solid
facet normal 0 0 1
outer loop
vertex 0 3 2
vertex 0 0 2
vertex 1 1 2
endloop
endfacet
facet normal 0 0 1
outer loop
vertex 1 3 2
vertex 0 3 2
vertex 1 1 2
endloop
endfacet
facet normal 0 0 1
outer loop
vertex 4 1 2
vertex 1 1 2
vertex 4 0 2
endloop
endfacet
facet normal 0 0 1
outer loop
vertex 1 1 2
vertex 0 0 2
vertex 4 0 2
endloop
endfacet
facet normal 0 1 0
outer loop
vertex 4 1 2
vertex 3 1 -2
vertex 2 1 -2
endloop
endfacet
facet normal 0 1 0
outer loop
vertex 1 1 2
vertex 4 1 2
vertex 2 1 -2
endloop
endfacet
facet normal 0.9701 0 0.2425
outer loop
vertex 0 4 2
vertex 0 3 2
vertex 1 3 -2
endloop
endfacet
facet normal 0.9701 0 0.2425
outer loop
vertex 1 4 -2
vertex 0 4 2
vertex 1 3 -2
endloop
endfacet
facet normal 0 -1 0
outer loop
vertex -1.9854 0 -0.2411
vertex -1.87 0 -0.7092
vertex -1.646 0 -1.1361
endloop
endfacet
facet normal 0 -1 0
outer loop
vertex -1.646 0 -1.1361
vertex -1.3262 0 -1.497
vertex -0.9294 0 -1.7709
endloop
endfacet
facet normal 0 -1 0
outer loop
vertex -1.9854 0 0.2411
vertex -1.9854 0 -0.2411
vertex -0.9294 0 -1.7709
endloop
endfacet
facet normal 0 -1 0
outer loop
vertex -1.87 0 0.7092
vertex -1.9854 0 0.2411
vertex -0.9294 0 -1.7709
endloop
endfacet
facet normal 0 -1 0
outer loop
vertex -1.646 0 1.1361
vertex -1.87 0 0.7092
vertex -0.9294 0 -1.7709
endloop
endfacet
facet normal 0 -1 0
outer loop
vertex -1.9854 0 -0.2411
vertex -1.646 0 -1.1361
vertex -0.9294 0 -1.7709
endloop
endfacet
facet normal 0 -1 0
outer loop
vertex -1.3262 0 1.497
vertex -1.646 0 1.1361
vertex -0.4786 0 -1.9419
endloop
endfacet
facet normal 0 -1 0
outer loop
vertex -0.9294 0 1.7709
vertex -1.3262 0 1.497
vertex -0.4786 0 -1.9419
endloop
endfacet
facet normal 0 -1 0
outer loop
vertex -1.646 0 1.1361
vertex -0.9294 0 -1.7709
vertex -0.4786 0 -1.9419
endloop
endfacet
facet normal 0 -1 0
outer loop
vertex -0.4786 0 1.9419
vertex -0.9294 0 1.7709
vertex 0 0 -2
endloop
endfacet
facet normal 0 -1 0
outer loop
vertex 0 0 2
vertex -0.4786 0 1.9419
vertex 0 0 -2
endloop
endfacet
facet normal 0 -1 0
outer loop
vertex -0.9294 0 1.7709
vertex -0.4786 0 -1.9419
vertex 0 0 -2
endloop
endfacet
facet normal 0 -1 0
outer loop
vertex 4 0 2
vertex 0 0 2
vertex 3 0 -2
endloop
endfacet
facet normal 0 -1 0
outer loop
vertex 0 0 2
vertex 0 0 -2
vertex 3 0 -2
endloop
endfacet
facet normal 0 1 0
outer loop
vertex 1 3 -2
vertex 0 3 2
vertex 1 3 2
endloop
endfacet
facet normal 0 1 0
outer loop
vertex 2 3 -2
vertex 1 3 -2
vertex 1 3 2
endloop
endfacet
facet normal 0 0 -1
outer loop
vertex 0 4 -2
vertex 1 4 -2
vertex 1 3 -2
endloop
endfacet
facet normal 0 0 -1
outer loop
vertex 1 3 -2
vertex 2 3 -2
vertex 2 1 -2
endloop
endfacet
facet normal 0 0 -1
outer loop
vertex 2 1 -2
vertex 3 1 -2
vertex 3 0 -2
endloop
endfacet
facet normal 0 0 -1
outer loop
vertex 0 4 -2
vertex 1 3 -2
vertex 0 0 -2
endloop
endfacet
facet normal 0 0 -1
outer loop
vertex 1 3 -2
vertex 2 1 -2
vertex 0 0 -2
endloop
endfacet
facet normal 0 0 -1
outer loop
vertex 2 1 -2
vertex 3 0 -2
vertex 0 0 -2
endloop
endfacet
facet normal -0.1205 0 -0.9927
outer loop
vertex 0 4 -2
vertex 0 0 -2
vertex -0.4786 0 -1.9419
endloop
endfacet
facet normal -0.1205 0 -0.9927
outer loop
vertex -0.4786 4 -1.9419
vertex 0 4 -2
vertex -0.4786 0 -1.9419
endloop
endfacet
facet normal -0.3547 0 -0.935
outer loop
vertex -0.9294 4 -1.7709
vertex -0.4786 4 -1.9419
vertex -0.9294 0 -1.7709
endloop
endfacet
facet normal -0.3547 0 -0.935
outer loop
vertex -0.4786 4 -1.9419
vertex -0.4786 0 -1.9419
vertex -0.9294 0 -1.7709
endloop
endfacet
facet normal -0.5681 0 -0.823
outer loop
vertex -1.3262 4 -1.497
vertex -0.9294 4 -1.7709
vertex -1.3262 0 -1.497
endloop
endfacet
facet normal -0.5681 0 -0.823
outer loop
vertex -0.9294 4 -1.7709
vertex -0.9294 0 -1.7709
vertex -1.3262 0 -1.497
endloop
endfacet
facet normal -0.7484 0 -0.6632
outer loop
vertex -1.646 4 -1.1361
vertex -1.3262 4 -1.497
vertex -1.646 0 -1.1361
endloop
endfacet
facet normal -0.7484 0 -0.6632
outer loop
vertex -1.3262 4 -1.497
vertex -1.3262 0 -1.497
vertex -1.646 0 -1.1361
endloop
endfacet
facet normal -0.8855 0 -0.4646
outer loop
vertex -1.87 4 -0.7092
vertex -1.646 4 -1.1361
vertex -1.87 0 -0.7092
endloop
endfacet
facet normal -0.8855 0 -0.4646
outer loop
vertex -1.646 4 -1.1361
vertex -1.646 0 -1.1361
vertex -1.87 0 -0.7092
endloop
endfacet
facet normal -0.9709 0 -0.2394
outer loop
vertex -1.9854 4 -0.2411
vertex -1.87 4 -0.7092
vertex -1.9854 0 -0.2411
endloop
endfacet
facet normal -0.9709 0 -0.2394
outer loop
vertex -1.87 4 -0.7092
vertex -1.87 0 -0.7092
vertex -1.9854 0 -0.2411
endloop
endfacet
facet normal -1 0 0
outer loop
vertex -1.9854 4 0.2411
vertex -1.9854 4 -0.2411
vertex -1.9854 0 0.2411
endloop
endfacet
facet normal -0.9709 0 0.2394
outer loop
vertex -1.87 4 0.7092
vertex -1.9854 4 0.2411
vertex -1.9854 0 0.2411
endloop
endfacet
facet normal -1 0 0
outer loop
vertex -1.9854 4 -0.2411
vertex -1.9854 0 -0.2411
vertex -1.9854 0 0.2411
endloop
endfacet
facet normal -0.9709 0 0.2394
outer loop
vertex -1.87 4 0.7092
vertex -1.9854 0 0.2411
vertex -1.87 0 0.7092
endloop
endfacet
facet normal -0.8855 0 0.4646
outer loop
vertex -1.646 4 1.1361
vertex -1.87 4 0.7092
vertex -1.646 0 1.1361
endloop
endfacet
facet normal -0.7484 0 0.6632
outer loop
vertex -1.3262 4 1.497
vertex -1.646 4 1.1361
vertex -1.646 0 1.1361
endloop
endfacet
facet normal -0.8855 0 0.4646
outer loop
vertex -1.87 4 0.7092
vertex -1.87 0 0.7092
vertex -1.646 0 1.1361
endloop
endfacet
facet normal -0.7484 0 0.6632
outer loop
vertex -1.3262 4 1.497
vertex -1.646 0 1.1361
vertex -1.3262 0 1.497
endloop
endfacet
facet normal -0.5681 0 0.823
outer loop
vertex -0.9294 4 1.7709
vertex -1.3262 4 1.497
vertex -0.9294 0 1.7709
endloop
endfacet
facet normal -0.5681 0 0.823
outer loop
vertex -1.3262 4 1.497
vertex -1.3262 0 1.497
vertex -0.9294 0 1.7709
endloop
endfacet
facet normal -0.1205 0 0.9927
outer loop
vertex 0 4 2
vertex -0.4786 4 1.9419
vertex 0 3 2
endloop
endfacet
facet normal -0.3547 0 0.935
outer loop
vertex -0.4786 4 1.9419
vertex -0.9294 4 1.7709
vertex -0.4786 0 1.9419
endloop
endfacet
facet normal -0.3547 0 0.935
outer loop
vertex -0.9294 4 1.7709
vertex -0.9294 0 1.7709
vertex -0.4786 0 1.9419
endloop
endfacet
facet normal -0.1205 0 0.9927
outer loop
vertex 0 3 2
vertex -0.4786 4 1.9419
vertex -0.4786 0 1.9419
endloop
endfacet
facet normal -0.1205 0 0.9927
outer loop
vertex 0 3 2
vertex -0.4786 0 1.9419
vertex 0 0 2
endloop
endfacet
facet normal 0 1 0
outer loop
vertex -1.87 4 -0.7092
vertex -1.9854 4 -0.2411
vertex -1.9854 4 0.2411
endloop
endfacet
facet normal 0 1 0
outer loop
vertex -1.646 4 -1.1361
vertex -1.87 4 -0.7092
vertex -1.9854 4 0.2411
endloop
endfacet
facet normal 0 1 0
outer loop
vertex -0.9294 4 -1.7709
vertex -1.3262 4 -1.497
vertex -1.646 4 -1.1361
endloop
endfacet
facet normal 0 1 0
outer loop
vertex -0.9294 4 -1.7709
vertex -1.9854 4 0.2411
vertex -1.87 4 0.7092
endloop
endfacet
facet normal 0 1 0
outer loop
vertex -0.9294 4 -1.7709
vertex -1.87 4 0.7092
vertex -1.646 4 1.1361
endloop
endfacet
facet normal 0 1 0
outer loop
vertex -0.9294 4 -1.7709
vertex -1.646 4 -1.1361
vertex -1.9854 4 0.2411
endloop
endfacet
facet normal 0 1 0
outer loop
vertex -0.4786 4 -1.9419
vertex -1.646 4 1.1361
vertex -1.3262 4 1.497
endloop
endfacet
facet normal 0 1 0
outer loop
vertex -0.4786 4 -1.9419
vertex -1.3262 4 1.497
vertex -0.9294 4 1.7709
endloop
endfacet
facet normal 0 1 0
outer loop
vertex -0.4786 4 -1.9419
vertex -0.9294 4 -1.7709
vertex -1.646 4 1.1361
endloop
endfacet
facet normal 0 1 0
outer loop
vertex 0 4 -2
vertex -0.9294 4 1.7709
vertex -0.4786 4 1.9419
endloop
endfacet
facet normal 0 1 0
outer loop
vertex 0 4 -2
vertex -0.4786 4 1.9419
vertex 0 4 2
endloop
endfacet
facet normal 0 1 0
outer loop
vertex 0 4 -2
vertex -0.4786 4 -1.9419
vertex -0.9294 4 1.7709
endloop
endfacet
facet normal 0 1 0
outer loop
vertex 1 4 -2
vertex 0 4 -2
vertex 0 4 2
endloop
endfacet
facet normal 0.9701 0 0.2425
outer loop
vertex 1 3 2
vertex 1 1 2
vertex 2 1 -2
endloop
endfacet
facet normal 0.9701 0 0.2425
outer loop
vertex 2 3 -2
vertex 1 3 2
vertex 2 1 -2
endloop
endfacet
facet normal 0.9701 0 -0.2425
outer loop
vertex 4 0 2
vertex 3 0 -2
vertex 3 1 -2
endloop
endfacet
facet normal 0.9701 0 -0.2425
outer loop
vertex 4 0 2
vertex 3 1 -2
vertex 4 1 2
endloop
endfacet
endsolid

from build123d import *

# Parameters (mm, degrees)
EXTRUDE_2_DEPTH = 4
EXTRUDE_3_DEPTH = 3
EXTRUDE_4_DEPTH = 1


with BuildPart() as part:
    # 草圖1 → 填料-伸長2 (new body)
    with BuildSketch(Plane(origin=(0, 0, 0), x_dir=(1, 0, 0), z_dir=(0, 1, 0))):
        with BuildLine():
            Line((1, 2), (0, 2))
            ThreePointArc((0, 2), (-2, 0), (0, -2))
            Line((0, -2), (1, 2))
        make_face()
    extrude(amount=EXTRUDE_2_DEPTH)

    # 草圖1<4> → 填料-伸長3 (add)
    with BuildSketch(Plane(origin=(0, 0, 0), x_dir=(1, 0, 0), z_dir=(0, 1, 0))):
        Polygon((1, 2), (0, -2), (1, -2), (2, 2), align=None)
    extrude(amount=EXTRUDE_3_DEPTH)

    # 草圖1<5> → 填料-伸長4 (add)
    with BuildSketch(Plane(origin=(0, 0, 0), x_dir=(1, 0, 0), z_dir=(0, 1, 0))):
        Polygon((2, 2), (1, -2), (4, -2), (3, 2), align=None)
    extrude(amount=EXTRUDE_4_DEPTH)


solid = part.part
